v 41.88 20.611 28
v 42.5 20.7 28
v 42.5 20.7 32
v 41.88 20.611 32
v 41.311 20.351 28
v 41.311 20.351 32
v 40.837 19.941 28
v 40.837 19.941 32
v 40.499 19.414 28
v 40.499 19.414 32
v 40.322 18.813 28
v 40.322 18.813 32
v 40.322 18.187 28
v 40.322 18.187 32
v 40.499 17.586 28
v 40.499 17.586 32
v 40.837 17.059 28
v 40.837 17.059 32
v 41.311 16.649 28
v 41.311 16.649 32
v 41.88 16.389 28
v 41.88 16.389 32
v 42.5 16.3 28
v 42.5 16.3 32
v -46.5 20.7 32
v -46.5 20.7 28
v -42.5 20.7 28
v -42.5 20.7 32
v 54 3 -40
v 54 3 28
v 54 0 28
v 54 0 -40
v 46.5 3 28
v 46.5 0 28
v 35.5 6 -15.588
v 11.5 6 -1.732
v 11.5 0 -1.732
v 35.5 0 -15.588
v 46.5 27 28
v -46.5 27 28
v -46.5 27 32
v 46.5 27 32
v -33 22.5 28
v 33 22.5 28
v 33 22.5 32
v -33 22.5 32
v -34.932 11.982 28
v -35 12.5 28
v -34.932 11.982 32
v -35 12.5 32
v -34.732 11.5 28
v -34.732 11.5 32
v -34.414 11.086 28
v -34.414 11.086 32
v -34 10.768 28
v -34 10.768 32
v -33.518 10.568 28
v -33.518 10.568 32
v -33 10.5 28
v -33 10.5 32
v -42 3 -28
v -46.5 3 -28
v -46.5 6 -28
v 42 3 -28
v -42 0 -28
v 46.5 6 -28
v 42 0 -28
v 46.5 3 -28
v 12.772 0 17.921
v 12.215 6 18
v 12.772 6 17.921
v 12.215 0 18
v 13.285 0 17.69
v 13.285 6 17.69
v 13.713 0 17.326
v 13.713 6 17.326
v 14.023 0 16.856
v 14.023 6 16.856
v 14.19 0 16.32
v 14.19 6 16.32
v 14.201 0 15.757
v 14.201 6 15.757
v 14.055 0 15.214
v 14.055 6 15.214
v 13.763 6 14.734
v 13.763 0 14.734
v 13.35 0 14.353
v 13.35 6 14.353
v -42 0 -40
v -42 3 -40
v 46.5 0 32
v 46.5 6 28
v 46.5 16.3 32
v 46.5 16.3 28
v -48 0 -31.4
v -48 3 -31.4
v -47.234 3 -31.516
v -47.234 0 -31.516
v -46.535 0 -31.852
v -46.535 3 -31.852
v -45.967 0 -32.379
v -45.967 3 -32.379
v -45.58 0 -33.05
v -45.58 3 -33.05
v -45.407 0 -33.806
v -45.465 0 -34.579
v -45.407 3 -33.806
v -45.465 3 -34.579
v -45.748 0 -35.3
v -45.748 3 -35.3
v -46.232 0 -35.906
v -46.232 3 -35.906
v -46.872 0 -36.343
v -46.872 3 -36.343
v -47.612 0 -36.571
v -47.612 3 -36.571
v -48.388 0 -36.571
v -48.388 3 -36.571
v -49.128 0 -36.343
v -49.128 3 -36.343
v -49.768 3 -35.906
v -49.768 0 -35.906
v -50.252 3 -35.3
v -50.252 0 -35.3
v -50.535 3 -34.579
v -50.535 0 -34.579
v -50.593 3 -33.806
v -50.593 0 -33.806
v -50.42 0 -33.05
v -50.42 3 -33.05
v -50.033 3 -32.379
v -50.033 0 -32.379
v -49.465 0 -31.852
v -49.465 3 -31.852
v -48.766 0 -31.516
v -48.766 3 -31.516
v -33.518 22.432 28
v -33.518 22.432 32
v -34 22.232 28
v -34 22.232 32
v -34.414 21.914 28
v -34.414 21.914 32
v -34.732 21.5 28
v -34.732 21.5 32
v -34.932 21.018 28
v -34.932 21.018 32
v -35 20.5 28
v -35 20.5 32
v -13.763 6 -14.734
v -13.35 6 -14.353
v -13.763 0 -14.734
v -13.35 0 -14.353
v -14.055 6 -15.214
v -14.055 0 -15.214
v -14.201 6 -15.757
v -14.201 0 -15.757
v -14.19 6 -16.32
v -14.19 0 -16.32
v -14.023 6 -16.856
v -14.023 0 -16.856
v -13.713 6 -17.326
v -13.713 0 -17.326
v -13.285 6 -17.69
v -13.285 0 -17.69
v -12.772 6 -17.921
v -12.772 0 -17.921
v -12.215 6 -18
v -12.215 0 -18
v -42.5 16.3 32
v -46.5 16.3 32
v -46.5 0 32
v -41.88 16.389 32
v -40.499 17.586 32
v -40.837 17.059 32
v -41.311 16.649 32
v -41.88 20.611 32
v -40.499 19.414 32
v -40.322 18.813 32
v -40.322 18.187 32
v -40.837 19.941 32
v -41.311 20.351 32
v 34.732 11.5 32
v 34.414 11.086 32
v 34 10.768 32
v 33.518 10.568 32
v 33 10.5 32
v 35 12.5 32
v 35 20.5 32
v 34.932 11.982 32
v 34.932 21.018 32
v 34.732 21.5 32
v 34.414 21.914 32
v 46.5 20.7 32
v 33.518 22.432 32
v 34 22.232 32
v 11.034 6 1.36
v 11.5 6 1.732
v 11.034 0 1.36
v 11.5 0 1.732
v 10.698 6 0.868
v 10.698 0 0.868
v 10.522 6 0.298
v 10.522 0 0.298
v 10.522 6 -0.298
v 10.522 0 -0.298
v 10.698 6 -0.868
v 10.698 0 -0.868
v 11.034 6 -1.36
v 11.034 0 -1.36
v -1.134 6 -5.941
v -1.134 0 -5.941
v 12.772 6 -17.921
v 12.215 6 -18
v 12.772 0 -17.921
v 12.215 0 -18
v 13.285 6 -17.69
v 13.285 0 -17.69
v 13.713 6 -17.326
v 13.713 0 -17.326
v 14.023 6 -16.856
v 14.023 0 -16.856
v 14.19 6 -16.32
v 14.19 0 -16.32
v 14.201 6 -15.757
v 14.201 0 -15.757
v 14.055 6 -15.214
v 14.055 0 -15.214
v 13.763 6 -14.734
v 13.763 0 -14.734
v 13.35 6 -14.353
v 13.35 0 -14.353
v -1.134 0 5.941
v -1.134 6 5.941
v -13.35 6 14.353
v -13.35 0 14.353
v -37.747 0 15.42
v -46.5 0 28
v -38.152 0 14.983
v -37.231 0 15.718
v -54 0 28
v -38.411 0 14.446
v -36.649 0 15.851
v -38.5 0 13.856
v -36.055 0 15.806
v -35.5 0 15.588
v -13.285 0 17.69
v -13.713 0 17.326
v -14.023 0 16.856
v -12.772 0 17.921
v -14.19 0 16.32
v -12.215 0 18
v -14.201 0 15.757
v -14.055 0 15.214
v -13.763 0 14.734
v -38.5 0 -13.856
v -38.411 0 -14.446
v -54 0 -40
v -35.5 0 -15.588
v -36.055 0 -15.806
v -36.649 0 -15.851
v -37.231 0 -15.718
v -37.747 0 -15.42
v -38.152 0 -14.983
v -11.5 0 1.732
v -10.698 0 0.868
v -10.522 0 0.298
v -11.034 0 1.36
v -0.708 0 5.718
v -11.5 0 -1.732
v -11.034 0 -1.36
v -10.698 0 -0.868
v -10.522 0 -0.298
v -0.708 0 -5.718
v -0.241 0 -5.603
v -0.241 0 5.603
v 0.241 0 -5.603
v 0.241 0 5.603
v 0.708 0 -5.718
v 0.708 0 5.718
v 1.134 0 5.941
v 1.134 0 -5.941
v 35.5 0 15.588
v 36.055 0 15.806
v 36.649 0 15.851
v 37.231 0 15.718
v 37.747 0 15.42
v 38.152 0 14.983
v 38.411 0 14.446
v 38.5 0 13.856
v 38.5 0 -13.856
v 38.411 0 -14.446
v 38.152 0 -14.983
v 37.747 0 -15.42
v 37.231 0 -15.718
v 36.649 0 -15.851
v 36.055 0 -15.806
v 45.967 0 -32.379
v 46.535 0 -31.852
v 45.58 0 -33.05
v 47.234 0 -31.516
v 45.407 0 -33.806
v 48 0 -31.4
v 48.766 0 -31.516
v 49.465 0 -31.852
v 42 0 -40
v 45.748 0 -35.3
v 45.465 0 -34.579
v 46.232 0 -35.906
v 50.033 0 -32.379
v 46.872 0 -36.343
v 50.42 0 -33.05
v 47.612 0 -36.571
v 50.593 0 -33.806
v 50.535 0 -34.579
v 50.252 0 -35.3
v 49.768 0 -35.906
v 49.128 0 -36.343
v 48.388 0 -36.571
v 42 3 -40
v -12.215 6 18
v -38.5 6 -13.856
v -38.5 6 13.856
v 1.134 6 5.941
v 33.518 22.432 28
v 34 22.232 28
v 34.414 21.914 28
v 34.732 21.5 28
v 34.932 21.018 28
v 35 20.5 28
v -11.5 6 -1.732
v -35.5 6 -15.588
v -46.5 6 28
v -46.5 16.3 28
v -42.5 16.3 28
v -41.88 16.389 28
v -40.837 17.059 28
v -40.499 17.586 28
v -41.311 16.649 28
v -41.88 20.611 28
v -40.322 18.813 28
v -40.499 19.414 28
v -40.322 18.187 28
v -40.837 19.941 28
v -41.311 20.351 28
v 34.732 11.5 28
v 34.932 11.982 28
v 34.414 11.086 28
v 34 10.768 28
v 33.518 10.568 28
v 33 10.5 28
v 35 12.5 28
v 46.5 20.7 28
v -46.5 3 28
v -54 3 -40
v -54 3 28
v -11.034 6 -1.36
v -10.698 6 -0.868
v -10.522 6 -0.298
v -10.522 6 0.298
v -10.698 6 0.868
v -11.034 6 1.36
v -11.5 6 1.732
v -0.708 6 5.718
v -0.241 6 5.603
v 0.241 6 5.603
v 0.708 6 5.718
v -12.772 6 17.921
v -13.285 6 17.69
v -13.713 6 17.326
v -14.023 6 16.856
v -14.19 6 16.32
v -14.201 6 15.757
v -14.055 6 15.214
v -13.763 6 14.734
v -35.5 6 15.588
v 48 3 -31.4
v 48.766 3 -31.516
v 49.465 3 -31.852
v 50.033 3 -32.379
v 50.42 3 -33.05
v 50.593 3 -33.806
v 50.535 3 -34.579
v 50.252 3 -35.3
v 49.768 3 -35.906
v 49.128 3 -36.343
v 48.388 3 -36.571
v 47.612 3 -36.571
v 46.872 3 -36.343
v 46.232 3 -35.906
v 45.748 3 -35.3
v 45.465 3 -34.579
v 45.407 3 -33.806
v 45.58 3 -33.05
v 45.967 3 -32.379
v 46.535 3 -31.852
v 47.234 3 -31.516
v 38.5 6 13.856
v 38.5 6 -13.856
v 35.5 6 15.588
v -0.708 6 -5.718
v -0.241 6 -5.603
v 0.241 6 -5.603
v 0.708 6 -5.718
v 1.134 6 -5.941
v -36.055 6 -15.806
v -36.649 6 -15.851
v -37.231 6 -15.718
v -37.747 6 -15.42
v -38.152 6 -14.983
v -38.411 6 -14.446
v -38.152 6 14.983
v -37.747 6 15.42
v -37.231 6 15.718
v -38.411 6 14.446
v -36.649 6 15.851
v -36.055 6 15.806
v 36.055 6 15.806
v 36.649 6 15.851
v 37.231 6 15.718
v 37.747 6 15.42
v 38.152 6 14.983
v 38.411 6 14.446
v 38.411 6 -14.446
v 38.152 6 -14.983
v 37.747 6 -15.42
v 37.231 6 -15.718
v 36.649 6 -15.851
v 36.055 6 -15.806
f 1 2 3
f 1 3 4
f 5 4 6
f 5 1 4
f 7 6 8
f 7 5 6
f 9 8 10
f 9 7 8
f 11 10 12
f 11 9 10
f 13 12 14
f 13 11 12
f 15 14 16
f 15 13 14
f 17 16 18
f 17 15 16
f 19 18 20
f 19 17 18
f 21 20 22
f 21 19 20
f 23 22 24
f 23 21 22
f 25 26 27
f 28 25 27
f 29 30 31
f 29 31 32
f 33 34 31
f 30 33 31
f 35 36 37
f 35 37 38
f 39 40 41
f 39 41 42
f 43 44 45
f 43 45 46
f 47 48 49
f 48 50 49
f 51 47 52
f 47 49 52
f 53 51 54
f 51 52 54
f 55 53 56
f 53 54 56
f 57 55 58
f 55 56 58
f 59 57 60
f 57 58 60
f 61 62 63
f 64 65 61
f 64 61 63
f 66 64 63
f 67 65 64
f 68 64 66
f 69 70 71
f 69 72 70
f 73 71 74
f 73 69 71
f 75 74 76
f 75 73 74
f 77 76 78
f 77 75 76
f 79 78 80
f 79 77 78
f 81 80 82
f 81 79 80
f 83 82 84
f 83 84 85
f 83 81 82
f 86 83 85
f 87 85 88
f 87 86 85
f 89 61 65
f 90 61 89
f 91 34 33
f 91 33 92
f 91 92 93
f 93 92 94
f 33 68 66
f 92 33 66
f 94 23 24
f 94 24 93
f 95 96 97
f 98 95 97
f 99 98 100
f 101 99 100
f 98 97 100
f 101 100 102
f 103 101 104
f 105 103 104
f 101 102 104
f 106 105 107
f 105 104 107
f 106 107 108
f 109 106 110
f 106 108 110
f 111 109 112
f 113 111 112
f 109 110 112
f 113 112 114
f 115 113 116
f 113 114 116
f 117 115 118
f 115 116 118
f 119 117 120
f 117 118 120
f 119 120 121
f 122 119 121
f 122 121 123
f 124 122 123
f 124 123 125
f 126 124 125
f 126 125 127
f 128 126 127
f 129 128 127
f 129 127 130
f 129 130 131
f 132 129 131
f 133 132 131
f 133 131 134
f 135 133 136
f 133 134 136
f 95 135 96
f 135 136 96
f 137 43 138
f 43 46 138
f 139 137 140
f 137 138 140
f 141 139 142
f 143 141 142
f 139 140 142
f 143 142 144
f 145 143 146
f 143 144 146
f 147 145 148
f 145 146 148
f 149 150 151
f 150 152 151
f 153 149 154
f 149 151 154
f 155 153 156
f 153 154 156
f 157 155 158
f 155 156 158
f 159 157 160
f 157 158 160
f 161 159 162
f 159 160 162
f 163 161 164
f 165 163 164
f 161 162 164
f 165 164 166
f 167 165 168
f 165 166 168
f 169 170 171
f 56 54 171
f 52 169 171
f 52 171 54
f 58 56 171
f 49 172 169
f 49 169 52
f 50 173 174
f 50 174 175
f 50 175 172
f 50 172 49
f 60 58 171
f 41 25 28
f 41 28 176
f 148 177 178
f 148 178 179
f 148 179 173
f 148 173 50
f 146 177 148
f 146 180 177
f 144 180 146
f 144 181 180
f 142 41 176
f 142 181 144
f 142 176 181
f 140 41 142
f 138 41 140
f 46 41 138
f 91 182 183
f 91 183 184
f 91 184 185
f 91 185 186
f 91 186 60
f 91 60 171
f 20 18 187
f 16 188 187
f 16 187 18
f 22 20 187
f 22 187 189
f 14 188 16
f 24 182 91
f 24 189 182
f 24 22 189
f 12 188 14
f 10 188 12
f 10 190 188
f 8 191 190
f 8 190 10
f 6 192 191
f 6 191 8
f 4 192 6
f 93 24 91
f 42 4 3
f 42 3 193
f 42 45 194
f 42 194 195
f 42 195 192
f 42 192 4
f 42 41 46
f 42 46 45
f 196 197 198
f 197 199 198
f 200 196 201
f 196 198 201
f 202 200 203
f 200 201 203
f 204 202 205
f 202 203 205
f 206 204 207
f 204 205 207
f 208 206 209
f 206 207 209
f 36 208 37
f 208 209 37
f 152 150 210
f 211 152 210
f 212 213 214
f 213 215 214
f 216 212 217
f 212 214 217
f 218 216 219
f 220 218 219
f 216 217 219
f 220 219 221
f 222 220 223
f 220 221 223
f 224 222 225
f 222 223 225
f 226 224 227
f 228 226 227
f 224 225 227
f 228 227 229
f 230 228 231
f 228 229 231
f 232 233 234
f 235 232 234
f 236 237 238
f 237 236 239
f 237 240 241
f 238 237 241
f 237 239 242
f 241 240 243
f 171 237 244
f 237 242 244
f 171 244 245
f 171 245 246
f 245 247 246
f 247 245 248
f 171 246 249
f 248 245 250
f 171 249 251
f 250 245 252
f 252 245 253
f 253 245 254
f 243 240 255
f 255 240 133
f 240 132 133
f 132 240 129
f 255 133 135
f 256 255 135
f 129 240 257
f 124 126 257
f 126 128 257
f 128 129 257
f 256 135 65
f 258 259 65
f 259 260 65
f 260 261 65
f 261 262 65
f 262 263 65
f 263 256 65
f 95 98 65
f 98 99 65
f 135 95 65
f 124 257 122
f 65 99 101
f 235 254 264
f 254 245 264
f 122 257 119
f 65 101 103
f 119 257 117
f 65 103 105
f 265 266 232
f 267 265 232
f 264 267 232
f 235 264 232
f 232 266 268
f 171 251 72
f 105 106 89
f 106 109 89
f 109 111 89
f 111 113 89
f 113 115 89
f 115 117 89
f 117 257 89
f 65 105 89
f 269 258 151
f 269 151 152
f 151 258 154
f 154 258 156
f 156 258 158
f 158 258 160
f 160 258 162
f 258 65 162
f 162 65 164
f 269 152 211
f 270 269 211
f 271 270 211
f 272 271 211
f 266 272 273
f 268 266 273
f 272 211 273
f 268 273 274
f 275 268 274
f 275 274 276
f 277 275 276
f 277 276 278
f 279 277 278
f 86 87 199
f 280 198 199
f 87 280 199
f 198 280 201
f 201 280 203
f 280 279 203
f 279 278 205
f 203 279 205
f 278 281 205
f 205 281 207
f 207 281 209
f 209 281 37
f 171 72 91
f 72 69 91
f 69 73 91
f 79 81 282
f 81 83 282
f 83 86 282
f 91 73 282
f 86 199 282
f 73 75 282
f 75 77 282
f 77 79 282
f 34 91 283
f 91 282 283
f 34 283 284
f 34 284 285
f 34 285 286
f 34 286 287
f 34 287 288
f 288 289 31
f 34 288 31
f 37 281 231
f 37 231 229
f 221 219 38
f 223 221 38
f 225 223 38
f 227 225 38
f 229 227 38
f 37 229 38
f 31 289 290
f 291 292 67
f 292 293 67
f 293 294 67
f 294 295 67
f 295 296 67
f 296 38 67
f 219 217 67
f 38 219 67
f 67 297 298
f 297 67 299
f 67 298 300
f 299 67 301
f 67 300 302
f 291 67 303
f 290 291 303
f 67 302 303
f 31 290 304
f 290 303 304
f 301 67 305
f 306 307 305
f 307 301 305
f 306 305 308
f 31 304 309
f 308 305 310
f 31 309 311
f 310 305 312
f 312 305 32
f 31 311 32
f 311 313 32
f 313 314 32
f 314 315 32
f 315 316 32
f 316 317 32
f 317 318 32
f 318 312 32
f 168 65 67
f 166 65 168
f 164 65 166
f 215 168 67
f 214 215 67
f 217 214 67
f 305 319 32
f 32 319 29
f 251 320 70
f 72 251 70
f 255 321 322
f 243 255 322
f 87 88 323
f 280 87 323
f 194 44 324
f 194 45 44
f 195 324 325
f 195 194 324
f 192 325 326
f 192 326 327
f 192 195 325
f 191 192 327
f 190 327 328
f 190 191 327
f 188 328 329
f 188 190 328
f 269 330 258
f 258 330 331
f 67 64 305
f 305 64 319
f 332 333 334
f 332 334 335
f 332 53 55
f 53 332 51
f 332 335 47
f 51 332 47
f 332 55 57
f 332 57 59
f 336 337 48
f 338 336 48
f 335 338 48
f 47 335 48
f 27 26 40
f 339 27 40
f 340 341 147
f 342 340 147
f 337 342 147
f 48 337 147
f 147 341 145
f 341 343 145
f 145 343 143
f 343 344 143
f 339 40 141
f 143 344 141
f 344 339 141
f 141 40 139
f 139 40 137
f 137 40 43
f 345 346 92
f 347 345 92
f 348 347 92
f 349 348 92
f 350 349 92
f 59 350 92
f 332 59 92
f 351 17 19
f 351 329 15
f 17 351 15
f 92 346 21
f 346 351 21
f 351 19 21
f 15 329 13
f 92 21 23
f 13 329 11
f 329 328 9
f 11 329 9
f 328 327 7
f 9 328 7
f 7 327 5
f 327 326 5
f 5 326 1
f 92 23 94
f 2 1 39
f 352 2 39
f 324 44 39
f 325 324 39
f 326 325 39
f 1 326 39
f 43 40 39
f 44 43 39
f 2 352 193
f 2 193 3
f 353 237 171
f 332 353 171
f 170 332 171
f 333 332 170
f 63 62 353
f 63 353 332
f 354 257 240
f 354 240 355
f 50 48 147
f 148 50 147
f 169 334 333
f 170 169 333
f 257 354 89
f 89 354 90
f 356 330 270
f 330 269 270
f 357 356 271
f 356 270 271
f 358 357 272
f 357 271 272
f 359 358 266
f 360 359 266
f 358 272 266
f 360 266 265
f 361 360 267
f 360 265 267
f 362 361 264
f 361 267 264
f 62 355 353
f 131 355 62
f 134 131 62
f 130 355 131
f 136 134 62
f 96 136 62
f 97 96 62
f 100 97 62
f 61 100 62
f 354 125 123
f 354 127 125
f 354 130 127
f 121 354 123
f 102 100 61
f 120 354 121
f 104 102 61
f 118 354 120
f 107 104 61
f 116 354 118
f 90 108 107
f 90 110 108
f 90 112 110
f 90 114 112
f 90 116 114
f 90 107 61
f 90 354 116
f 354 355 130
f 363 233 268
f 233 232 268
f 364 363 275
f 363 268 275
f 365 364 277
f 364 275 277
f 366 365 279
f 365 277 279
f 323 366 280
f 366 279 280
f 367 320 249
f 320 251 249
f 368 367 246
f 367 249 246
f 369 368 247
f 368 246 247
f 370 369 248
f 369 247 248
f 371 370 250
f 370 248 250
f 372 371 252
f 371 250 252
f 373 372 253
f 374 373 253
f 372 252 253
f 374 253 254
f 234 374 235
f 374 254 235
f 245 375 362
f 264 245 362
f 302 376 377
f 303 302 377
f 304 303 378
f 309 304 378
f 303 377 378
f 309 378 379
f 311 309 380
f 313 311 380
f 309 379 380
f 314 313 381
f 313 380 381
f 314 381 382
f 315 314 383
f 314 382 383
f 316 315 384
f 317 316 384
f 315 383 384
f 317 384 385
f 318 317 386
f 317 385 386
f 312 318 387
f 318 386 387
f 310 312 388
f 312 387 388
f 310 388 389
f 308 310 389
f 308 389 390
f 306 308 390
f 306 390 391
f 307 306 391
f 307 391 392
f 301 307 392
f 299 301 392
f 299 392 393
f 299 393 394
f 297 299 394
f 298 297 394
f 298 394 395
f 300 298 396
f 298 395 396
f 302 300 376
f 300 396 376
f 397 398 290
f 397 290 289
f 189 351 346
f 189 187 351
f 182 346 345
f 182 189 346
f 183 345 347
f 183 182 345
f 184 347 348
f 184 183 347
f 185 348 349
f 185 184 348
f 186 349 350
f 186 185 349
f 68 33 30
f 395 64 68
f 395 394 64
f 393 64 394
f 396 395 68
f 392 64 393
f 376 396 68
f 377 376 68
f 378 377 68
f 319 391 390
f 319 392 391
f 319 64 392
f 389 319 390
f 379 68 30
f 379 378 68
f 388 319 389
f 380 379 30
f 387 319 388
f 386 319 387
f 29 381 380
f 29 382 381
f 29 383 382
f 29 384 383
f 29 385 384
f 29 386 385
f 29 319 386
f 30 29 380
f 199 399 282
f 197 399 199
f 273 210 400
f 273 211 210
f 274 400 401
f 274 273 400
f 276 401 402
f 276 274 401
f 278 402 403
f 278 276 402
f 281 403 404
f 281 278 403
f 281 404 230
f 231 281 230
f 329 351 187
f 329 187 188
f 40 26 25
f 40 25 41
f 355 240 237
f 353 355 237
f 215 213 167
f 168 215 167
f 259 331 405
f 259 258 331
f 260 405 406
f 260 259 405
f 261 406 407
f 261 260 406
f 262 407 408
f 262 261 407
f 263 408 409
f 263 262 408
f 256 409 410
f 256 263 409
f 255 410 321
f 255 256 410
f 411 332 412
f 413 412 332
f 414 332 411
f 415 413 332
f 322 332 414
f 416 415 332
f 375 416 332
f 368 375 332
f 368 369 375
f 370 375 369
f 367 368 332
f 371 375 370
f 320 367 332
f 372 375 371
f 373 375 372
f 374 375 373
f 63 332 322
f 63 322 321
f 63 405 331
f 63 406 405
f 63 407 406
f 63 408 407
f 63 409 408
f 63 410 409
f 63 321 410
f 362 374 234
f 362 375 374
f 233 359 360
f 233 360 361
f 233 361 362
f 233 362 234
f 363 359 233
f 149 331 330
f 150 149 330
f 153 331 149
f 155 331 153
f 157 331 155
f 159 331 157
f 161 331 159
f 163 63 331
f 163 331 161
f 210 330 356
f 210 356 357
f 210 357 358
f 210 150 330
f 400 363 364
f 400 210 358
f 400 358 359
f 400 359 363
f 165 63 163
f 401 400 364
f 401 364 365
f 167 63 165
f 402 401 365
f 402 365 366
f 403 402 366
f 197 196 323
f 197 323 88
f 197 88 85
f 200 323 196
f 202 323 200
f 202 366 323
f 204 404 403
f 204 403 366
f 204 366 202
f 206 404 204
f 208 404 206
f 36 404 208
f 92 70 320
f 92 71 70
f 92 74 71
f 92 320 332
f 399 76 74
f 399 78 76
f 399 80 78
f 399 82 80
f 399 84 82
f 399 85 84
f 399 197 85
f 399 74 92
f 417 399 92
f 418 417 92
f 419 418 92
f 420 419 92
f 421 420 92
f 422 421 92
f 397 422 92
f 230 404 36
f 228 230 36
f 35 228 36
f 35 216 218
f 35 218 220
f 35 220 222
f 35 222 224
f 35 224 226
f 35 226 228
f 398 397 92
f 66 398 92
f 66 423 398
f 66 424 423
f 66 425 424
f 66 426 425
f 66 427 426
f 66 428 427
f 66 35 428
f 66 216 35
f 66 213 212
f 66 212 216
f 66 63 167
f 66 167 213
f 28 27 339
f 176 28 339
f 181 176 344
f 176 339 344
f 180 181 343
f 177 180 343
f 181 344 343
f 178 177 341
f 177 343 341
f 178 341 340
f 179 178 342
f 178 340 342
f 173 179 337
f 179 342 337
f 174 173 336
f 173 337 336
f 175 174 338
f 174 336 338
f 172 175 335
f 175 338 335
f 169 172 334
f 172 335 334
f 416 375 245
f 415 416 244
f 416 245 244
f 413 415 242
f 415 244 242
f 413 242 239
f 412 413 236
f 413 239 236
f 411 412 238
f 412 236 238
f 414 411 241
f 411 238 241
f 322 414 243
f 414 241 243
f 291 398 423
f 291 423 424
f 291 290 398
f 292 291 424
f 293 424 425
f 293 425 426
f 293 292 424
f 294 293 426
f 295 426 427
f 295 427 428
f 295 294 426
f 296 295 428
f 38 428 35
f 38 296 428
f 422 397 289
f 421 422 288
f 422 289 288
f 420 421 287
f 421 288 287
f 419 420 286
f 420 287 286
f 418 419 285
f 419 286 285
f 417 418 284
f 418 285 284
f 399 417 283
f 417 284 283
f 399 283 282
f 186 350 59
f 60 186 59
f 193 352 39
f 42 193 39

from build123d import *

# Parameters (mm, degrees)
SKETCH_1_W          = 116
SKETCH_1_H          = 56
EXTRUDE_1_DEPTH     = 3
SKETCH_2_W          = 93
SKETCH_2_H          = 56
EXTRUDE_2_DEPTH     = 3
SKETCH_3_W          = 93
SKETCH_3_H          = 27
EXTRUDE_3_DEPTH     = 4
SKETCH_5_W          = 12
SKETCH_5_H          = 12
EXTRUDE_4_DEPTH     = 3
SKETCH_6_R          = 2.6
CUT_EXTRUDE_1_DEPTH = 3
CUT_EXTRUDE_2_DEPTH = 74.518705103
SKETCH_8_W          = 70
SKETCH_8_H          = 12
CUT_EXTRUDE_3_DEPTH = 94.364875622
SKETCH_9_W          = 4
SKETCH_9_H          = 3
CUT_EXTRUDE_4_DEPTH = 88.709748603
CUT_EXTRUDE_5_DEPTH = 91.93404203
FILLET_1_R          = 2


with BuildPart() as part:
    # 草图1 → 凸台-拉伸1 (new body)
    with BuildSketch(Plane(origin=(0, 0, 0), x_dir=(1, 0, 0), z_dir=(0, 1, 0))):
        Rectangle(SKETCH_1_W, SKETCH_1_H)
    extrude(amount=EXTRUDE_1_DEPTH)

    # 草图2 → 凸台-拉伸2 (add)
    with BuildSketch(Plane(origin=(0, 3, 0), x_dir=(1, 0, 0), z_dir=(0, 1, 0))):
        Rectangle(SKETCH_2_W, SKETCH_2_H)
    extrude(amount=EXTRUDE_2_DEPTH)

    # 草图3 → 凸台-拉伸3 (add)
    with BuildSketch(Plane.XY.offset(28)):
        with Locations((0, 13.5)):
            Rectangle(SKETCH_3_W, SKETCH_3_H)
    extrude(amount=EXTRUDE_3_DEPTH)

    # 草图5 → 凸台-拉伸4 (add)
    with BuildSketch(Plane(origin=(0, 3, 0), x_dir=(1, 0, 0), z_dir=(0, 1, 0))):
        with Locations((48, 34)):
            Rectangle(SKETCH_5_W, SKETCH_5_H)
        with Locations((-48, 34)):
            Rectangle(SKETCH_5_W, SKETCH_5_H)
    extrude(amount=-EXTRUDE_4_DEPTH)

    # 草图6 → 切除-拉伸1 (cut)
    with BuildSketch(Plane(origin=(0, 3, 0), x_dir=(1, 0, 0), z_dir=(0, 1, 0))):
        with Locations(Location((-48, 34, 0), (0, 0, 270))):
            Circle(SKETCH_6_R)
        with Locations(Location((48, 34, 0), (0, 0, 270))):
            Circle(SKETCH_6_R)
    extrude(amount=-CUT_EXTRUDE_1_DEPTH, mode=Mode.SUBTRACT)

    # 草图7 → 切除-拉伸2 (cut, through all)
    with BuildSketch(Plane(origin=(0, 6, 0), x_dir=(1, 0, 0), z_dir=(0, 1, 0))):
        Polygon((-18.64631219, 18), (0, 5.160153957), (18.64631219, 18), align=None)
        Polygon((-8.5, 0), (-38.5, 17.320508076), (-38.5, -17.320508076), align=None)
        Polygon((38.5, -17.320508076), (8.5, 0), (38.5, 17.320508076), align=None)
        Polygon((-18.64631219, -18), (18.64631219, -18), (0, -5.160153957), align=None)
    extrude(amount=-CUT_EXTRUDE_2_DEPTH, mode=Mode.SUBTRACT)

    # 草图8 → 切除-拉伸3 (cut, through all)
    with BuildSketch(Plane(origin=(0, 0, 28), x_dir=(-1, 0, 0), z_dir=(0, 0, -1))):
        with Locations((0, 16.5)):
            Rectangle(SKETCH_8_W, SKETCH_8_H)
    extrude(amount=-CUT_EXTRUDE_3_DEPTH, mode=Mode.SUBTRACT)

    # 草图9 → 切除-拉伸4 (cut, through all)
    with BuildSketch(Plane(origin=(0, 0, -28), x_dir=(-1, 0, 0), z_dir=(0, 0, -1))):
        with Locations((56, 1.5)):
            Rectangle(SKETCH_9_W, SKETCH_9_H)
        with Locations((-56, 1.5)):
            Rectangle(SKETCH_9_W, SKETCH_9_H)
    extrude(amount=-CUT_EXTRUDE_4_DEPTH, mode=Mode.SUBTRACT)

    # 草图10 → 切除-拉伸5 (cut, through all)
    with BuildSketch(Plane(origin=(0, 0, 28), x_dir=(-1, 0, 0), z_dir=(0, 0, -1))):
        with BuildLine():
            Line((-46.5, 20.7), (-42.5, 20.7))
            ThreePointArc((-42.5, 20.7), (-40.3, 18.5), (-42.5, 16.3))
            Line((-42.5, 16.3), (-46.5, 16.3))
            ThreePointArc((-46.5, 16.3), (-48.7, 18.5), (-46.5, 20.7))
        make_face()
        with BuildLine():
            Line((46.5, 20.7), (42.5, 20.7))
            ThreePointArc((42.5, 20.7), (40.3, 18.5), (42.5, 16.3))
            Line((42.5, 16.3), (46.5, 16.3))
            ThreePointArc((46.5, 16.3), (48.7, 18.5), (46.5, 20.7))
        make_face()
    extrude(amount=-CUT_EXTRUDE_5_DEPTH, mode=Mode.SUBTRACT)

    # 圆角1
    fillet_1_edges = [part.edges().sort_by_distance(p)[0] for p in [
        (0, 3, -5.160153957),
        (-18.64631219, 3, -18),
        (-18.64631219, 3, 18),
        (0, 3, 5.160153957),
        (18.64631219, 3, 18),
        (-8.5, 3, 0),
        (-38.5, 3, 17.320508076),
        (-38.5, 3, -17.320508076),
        (-35, 22.5, 30),
        (-35, 10.5, 30),
        (35, 10.5, 30),
        (35, 22.5, 30),
        (38.5, 3, -17.320508076),
        (38.5, 3, 17.320508076),
        (8.5, 3, 0),
        (18.64631219, 3, -18),
    ]]
    fillet(fillet_1_edges, radius=FILLET_1_R)


solid = part.part
